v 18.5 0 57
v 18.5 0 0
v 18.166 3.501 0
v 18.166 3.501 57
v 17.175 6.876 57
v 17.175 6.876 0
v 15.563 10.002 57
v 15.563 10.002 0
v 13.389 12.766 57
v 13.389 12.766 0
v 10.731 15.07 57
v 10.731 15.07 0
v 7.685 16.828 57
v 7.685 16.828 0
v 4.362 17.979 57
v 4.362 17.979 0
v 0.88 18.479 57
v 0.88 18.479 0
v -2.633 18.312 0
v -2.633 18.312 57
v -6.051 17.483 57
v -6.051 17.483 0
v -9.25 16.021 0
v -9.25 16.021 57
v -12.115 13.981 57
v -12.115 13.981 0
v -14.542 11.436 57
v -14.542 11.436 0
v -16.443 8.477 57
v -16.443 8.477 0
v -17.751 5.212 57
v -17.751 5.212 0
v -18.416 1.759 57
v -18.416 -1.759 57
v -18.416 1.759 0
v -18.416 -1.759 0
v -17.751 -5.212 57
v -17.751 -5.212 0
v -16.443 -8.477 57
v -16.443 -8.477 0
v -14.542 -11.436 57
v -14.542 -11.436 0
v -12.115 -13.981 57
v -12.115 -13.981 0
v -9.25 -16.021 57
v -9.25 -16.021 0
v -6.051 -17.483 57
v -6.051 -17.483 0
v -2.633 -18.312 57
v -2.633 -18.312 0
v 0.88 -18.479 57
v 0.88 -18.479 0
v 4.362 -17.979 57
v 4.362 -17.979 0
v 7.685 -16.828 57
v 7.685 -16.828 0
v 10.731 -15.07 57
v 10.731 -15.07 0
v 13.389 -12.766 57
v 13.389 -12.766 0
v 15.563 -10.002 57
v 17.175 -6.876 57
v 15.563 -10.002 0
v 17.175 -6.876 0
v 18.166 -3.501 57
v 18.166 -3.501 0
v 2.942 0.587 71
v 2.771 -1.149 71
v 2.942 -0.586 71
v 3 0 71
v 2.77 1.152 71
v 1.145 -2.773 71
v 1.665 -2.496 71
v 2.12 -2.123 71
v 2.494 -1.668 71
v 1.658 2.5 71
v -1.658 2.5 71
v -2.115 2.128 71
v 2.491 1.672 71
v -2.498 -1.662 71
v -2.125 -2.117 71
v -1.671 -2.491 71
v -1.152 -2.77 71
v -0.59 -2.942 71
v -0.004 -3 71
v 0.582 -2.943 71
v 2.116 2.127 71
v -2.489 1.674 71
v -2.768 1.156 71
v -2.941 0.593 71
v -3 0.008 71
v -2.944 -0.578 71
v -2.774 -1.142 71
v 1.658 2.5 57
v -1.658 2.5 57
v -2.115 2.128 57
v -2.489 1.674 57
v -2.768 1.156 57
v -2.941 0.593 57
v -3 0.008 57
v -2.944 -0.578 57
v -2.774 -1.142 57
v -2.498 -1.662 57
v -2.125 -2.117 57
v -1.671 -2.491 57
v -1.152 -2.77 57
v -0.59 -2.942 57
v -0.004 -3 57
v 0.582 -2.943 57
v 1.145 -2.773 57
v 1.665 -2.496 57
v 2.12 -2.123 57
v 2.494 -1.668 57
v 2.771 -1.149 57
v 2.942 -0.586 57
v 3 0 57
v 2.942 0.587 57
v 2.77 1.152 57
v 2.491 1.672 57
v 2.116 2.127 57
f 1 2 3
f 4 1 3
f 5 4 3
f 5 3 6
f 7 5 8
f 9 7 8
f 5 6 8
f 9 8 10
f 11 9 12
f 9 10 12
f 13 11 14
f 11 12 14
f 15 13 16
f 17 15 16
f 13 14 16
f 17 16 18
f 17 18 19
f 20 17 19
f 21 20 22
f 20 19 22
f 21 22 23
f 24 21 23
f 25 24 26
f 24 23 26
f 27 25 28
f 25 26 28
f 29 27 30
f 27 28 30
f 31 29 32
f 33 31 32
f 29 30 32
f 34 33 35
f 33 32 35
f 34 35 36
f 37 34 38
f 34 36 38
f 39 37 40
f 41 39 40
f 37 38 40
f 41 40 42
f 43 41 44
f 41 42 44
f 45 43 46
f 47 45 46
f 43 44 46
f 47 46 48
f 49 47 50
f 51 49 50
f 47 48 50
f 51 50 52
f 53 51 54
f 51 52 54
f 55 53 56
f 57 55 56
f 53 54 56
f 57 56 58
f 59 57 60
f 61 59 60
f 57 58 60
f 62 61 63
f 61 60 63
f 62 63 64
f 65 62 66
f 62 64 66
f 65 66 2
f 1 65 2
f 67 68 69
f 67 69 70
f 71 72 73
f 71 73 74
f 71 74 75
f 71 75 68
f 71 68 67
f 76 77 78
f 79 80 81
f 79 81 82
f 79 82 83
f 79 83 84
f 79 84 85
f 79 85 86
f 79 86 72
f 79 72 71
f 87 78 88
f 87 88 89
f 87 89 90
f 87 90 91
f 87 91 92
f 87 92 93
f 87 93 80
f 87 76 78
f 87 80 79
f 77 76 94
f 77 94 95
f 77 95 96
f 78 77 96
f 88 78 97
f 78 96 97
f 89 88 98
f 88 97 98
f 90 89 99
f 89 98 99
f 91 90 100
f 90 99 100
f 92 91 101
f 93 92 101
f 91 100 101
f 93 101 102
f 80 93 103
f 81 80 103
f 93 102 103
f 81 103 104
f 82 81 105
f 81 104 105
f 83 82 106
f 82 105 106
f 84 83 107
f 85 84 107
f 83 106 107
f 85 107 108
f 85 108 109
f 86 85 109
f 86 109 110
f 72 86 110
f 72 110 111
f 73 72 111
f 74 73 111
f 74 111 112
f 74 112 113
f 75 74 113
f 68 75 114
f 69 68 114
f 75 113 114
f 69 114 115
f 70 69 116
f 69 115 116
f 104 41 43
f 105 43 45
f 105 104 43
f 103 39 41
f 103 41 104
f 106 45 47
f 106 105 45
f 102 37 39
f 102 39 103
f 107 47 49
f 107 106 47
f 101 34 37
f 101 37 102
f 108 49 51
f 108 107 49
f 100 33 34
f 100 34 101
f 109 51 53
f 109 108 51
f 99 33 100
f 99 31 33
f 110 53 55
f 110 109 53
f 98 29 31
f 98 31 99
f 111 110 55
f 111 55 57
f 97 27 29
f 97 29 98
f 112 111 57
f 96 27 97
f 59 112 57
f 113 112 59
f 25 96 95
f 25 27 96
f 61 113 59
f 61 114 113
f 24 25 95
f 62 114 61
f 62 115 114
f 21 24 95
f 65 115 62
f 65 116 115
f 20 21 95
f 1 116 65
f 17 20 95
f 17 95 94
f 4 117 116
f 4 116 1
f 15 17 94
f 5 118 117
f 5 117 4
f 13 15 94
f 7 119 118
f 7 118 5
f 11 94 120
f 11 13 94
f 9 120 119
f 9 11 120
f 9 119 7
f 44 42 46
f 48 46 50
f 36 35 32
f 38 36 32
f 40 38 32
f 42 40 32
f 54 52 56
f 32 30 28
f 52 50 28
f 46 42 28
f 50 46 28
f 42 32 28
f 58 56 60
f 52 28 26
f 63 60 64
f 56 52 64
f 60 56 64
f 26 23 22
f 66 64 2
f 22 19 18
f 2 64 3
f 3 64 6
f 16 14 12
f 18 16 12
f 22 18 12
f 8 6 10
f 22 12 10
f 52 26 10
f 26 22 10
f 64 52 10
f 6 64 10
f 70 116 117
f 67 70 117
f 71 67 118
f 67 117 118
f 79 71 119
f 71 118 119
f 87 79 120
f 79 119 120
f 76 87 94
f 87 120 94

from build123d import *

# Parameters (mm, degrees)
SKETCH1_R           = 18.5
BOSS_EXTRUDE1_DEPTH = 57
BOSS_EXTRUDE2_DEPTH = 14


with BuildPart() as part:
    # Sketch1 → Boss-Extrude1 (new body)
    with BuildSketch(Plane.XY):
        Circle(SKETCH1_R)
    extrude(amount=BOSS_EXTRUDE1_DEPTH)

    # Sketch2 → Boss-Extrude2 (add)
    with BuildSketch(Plane.XY.offset(57)):
        with BuildLine():
            Line((1.658312395, 2.5), (-1.658312395, 2.5))
            ThreePointArc((-1.658312395, 2.5), (-1.418637165, -2.643382037), (3, 0))
            ThreePointArc((3, 0), (2.643382037, 1.418637165), (1.658312395, 2.5))
        make_face()
    extrude(amount=BOSS_EXTRUDE2_DEPTH)


solid = part.part
